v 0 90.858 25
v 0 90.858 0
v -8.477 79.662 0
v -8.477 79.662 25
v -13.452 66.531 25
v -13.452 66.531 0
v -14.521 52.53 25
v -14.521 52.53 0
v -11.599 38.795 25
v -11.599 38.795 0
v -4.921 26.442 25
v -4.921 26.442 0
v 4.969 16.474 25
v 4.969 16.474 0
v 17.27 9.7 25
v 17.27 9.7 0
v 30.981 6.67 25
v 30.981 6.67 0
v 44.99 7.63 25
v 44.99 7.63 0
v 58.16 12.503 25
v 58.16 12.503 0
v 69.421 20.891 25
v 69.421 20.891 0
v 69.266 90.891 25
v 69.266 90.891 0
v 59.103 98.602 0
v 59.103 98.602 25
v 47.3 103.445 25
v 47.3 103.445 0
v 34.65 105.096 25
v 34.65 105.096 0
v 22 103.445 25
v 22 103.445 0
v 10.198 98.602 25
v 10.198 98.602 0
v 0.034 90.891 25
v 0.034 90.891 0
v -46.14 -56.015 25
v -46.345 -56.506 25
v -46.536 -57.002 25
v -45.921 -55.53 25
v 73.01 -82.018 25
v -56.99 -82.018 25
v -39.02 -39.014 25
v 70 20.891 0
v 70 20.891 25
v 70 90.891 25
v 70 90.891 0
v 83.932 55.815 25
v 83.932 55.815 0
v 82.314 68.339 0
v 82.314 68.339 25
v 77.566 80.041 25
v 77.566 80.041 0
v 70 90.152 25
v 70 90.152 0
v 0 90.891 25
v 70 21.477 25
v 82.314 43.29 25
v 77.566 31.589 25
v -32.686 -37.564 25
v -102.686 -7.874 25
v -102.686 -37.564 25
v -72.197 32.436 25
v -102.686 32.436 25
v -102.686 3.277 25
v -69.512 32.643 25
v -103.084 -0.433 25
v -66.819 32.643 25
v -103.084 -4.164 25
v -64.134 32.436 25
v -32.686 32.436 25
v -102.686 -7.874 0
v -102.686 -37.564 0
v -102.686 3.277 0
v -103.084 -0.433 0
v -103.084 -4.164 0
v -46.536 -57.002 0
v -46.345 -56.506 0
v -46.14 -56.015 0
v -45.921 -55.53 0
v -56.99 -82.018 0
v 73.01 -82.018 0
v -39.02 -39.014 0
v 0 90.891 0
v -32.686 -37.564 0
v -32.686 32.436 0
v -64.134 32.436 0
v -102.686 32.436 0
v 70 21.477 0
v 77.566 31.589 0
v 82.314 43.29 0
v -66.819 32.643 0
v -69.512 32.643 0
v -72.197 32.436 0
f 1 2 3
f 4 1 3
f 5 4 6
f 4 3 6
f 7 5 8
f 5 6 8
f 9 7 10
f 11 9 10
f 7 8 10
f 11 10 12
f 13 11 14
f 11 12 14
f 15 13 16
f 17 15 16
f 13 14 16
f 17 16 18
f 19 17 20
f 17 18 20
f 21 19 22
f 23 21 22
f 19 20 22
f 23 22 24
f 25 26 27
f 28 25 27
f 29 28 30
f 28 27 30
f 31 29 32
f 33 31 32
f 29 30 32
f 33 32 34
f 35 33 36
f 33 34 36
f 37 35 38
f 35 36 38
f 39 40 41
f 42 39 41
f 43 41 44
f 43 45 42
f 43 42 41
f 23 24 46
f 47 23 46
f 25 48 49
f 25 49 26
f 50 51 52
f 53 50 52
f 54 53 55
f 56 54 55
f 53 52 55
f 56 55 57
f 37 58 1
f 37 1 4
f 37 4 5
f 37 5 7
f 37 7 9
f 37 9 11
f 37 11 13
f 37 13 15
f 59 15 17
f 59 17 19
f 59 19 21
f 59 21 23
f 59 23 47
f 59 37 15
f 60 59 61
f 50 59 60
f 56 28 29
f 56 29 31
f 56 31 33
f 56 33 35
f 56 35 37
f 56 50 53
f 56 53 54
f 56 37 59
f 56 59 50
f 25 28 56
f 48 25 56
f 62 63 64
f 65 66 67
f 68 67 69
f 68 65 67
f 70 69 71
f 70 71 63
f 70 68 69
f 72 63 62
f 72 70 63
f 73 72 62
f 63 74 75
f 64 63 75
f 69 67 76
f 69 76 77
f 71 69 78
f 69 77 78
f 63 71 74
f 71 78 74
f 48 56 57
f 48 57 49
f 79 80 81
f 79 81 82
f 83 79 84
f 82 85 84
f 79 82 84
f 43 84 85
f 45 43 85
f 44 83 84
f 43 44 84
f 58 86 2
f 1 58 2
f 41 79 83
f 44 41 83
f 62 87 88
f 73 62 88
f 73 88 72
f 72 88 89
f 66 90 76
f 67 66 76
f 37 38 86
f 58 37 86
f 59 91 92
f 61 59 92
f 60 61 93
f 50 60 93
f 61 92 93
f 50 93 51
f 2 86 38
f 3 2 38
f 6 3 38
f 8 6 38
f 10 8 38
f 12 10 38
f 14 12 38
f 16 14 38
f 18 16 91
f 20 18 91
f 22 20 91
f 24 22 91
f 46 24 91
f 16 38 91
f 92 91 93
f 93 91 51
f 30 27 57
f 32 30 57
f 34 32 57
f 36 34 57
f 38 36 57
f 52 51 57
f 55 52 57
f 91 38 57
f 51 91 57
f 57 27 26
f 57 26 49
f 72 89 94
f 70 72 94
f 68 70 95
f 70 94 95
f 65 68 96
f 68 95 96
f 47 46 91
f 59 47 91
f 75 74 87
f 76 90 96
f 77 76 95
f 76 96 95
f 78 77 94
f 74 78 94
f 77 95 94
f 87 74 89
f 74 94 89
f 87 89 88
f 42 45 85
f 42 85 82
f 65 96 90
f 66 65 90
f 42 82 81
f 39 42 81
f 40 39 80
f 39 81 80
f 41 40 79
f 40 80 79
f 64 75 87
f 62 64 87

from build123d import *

# Parameters (mm, degrees)
F1_DEPTH = 25


with BuildPart() as f1:
    # F0 (on Top) → F1 (new body)
    with BuildSketch(Plane.XY):
        with BuildLine():
            Line((0, 90.8575442151), (0, 20.8914719523))
            Line((0, 20.8914719523), (69.4212459708, 20.8914719523))
            ThreePointArc((69.4212459708, 20.8914719523), (69.7118470145, 21.1832320959), (70, 21.4774102816))
            Line((70, 21.4774102816), (70, 90.1521279564))
            ThreePointArc((70, 90.1521279564), (69.6351955614, 90.5237377084), (69.2664848185, 90.8914719523))
            Line((69.2664848185, 90.8914719523), (0.0343455458, 90.8914719523))
            ThreePointArc((0.0343455458, 90.8914719523), (0.0171686183, 90.8745122894), (0, 90.8575442151))
        make_face()
        with BuildLine():
            Line((69.4212459708, 20.8914719523), (0, 20.8914719523))
            Line((0, 20.8914719523), (0, 90.8575442151))
            ThreePointArc((0, 90.8575442151), (-0.3326727598, 21.1040947266), (69.4212459708, 20.8914719523))
        make_face()
        with BuildLine():
            ThreePointArc((70, 21.4774102816), (69.7118470145, 21.1832320959), (69.4212459708, 20.8914719523))
            Line((69.4212459708, 20.8914719523), (70, 20.8914719523))
            Line((70, 20.8914719523), (70, 21.4774102816))
        make_face()
        with BuildLine():
            Line((0, 90.8914719523), (0, 90.8575442151))
            ThreePointArc((0, 90.8575442151), (0.0171686183, 90.8745122894), (0.0343455458, 90.8914719523))
            Line((0.0343455458, 90.8914719523), (0, 90.8914719523))
        make_face()
        with BuildLine():
            Line((70, 90.1521279564), (70, 21.4774102816))
            ThreePointArc((70, 21.4774102816), (80.3161635629, 37.2867691311), (83.9317235934, 55.814769119))
            ThreePointArc((83.9317235934, 55.814769119), (80.3161635629, 74.342769107), (70, 90.1521279564))
        make_face()
        with BuildLine():
            ThreePointArc((69.2664848185, 90.8914719523), (34.6504151821, 105.0960775303), (0.0343455458, 90.8914719523))
            Line((0.0343455458, 90.8914719523), (69.2664848185, 90.8914719523))
        make_face()
        with BuildLine():
            ThreePointArc((69.2664848185, 90.8914719523), (69.6351955614, 90.5237377084), (70, 90.1521279564))
            Line((70, 90.1521279564), (70, 90.8914719523))
            Line((70, 90.8914719523), (69.2664848185, 90.8914719523))
        make_face()
    extrude(amount=F1_DEPTH)


with BuildPart() as f1b:
    # F0 (on Top) → F1, piece 2 (new body)
    with BuildSketch(Plane.XY):
        with BuildLine():
            Line((-72.1971484777, 32.4358825386), (-102.6861071587, 32.4358825386))
            Line((-102.6861071587, 32.4358825386), (-102.6861071587, 3.2767011646))
            ThreePointArc((-102.6861071587, 3.2767011646), (-92.3343982655, 22.972192538), (-72.1971484777, 32.4358825386))
        make_face()
        with BuildLine():
            ThreePointArc((-64.1342756394, 32.4358825386), (-68.1657120585, 32.6690524463), (-72.1971484777, 32.4358825386))
            Line((-72.1971484777, 32.4358825386), (-64.1342756394, 32.4358825386))
        make_face()
        with BuildLine():
            Line((-64.1342756394, 32.4358825386), (-72.1971484777, 32.4358825386))
            ThreePointArc((-72.1971484777, 32.4358825386), (-92.3343982655, 22.972192538), (-102.6861071587, 3.2767011646))
            Line((-102.6861071587, 3.2767011646), (-102.6861071587, -7.8740693491))
            ThreePointArc((-102.6861071587, -7.8740693491), (-65.3690607072, -37.1544058585), (-33.19797552, -2.2986840922))
            ThreePointArc((-33.19797552, -2.2986840922), (-42.0533318031, 20.9582760709), (-64.1342756394, 32.4358825386))
        make_face()
        with BuildLine():
            Line((-102.6861071587, -7.8740693491), (-102.6861071587, 3.2767011646))
            ThreePointArc((-102.6861071587, 3.2767011646), (-103.1334485971, -2.2986840922), (-102.6861071587, -7.8740693491))
        make_face()
        with BuildLine():
            Line((-32.6861071587, 32.4358825386), (-64.1342756394, 32.4358825386))
            ThreePointArc((-64.1342756394, 32.4358825386), (-42.0533318031, 20.9582760709), (-33.19797552, -2.2986840922))
            ThreePointArc((-33.19797552, -2.2986840922), (-65.3690607072, -37.1544058585), (-102.6861071587, -7.8740693491))
            Line((-102.6861071587, -7.8740693491), (-102.6861071587, -37.5641174614))
            Line((-102.6861071587, -37.5641174614), (-32.6861071587, -37.5641174614))
            Line((-32.6861071587, -37.5641174614), (-32.6861071587, 32.4358825386))
        make_face()
    extrude(amount=F1_DEPTH)


with BuildPart() as f1c:
    # F0 (on Top) → F1, piece 3 (new body)
    with BuildSketch(Plane.XY):
        with BuildLine():
            Line((-46.5364518579, -57.0023388426), (-56.9900460541, -82.0184350014))
            Line((-56.9900460541, -82.0184350014), (73.0099539459, -82.0184350014))
            Line((73.0099539459, -82.0184350014), (-39.0196972338, -39.0142810559))
            Line((-39.0196972338, -39.0142810559), (-45.9210690424, -55.5296897806))
            ThreePointArc((-45.9210690424, -55.5296897806), (-25.1471062076, -45.3361467034), (-10.6750561446, -63.3923262358))
            ThreePointArc((-10.6750561446, -63.3923262358), (-32.4203742571, -81.6054509086), (-46.5364518579, -57.0023388426))
        make_face()
        with BuildLine():
            ThreePointArc((-45.9210690424, -55.5296897806), (-46.2446491203, -56.259374838), (-46.5364518579, -57.0023388426))
            Line((-46.5364518579, -57.0023388426), (-45.9210690424, -55.5296897806))
        make_face()
        with BuildLine():
            Line((-45.9210690424, -55.5296897806), (-46.5364518579, -57.0023388426))
            ThreePointArc((-46.5364518579, -57.0023388426), (-32.4203742571, -81.6054509086), (-10.6750561446, -63.3923262358))
            ThreePointArc((-10.6750561446, -63.3923262358), (-25.1471062076, -45.3361467034), (-45.9210690424, -55.5296897806))
        make_face()
    extrude(amount=F1_DEPTH)


solid = Compound([f1.part, f1b.part, f1c.part])
